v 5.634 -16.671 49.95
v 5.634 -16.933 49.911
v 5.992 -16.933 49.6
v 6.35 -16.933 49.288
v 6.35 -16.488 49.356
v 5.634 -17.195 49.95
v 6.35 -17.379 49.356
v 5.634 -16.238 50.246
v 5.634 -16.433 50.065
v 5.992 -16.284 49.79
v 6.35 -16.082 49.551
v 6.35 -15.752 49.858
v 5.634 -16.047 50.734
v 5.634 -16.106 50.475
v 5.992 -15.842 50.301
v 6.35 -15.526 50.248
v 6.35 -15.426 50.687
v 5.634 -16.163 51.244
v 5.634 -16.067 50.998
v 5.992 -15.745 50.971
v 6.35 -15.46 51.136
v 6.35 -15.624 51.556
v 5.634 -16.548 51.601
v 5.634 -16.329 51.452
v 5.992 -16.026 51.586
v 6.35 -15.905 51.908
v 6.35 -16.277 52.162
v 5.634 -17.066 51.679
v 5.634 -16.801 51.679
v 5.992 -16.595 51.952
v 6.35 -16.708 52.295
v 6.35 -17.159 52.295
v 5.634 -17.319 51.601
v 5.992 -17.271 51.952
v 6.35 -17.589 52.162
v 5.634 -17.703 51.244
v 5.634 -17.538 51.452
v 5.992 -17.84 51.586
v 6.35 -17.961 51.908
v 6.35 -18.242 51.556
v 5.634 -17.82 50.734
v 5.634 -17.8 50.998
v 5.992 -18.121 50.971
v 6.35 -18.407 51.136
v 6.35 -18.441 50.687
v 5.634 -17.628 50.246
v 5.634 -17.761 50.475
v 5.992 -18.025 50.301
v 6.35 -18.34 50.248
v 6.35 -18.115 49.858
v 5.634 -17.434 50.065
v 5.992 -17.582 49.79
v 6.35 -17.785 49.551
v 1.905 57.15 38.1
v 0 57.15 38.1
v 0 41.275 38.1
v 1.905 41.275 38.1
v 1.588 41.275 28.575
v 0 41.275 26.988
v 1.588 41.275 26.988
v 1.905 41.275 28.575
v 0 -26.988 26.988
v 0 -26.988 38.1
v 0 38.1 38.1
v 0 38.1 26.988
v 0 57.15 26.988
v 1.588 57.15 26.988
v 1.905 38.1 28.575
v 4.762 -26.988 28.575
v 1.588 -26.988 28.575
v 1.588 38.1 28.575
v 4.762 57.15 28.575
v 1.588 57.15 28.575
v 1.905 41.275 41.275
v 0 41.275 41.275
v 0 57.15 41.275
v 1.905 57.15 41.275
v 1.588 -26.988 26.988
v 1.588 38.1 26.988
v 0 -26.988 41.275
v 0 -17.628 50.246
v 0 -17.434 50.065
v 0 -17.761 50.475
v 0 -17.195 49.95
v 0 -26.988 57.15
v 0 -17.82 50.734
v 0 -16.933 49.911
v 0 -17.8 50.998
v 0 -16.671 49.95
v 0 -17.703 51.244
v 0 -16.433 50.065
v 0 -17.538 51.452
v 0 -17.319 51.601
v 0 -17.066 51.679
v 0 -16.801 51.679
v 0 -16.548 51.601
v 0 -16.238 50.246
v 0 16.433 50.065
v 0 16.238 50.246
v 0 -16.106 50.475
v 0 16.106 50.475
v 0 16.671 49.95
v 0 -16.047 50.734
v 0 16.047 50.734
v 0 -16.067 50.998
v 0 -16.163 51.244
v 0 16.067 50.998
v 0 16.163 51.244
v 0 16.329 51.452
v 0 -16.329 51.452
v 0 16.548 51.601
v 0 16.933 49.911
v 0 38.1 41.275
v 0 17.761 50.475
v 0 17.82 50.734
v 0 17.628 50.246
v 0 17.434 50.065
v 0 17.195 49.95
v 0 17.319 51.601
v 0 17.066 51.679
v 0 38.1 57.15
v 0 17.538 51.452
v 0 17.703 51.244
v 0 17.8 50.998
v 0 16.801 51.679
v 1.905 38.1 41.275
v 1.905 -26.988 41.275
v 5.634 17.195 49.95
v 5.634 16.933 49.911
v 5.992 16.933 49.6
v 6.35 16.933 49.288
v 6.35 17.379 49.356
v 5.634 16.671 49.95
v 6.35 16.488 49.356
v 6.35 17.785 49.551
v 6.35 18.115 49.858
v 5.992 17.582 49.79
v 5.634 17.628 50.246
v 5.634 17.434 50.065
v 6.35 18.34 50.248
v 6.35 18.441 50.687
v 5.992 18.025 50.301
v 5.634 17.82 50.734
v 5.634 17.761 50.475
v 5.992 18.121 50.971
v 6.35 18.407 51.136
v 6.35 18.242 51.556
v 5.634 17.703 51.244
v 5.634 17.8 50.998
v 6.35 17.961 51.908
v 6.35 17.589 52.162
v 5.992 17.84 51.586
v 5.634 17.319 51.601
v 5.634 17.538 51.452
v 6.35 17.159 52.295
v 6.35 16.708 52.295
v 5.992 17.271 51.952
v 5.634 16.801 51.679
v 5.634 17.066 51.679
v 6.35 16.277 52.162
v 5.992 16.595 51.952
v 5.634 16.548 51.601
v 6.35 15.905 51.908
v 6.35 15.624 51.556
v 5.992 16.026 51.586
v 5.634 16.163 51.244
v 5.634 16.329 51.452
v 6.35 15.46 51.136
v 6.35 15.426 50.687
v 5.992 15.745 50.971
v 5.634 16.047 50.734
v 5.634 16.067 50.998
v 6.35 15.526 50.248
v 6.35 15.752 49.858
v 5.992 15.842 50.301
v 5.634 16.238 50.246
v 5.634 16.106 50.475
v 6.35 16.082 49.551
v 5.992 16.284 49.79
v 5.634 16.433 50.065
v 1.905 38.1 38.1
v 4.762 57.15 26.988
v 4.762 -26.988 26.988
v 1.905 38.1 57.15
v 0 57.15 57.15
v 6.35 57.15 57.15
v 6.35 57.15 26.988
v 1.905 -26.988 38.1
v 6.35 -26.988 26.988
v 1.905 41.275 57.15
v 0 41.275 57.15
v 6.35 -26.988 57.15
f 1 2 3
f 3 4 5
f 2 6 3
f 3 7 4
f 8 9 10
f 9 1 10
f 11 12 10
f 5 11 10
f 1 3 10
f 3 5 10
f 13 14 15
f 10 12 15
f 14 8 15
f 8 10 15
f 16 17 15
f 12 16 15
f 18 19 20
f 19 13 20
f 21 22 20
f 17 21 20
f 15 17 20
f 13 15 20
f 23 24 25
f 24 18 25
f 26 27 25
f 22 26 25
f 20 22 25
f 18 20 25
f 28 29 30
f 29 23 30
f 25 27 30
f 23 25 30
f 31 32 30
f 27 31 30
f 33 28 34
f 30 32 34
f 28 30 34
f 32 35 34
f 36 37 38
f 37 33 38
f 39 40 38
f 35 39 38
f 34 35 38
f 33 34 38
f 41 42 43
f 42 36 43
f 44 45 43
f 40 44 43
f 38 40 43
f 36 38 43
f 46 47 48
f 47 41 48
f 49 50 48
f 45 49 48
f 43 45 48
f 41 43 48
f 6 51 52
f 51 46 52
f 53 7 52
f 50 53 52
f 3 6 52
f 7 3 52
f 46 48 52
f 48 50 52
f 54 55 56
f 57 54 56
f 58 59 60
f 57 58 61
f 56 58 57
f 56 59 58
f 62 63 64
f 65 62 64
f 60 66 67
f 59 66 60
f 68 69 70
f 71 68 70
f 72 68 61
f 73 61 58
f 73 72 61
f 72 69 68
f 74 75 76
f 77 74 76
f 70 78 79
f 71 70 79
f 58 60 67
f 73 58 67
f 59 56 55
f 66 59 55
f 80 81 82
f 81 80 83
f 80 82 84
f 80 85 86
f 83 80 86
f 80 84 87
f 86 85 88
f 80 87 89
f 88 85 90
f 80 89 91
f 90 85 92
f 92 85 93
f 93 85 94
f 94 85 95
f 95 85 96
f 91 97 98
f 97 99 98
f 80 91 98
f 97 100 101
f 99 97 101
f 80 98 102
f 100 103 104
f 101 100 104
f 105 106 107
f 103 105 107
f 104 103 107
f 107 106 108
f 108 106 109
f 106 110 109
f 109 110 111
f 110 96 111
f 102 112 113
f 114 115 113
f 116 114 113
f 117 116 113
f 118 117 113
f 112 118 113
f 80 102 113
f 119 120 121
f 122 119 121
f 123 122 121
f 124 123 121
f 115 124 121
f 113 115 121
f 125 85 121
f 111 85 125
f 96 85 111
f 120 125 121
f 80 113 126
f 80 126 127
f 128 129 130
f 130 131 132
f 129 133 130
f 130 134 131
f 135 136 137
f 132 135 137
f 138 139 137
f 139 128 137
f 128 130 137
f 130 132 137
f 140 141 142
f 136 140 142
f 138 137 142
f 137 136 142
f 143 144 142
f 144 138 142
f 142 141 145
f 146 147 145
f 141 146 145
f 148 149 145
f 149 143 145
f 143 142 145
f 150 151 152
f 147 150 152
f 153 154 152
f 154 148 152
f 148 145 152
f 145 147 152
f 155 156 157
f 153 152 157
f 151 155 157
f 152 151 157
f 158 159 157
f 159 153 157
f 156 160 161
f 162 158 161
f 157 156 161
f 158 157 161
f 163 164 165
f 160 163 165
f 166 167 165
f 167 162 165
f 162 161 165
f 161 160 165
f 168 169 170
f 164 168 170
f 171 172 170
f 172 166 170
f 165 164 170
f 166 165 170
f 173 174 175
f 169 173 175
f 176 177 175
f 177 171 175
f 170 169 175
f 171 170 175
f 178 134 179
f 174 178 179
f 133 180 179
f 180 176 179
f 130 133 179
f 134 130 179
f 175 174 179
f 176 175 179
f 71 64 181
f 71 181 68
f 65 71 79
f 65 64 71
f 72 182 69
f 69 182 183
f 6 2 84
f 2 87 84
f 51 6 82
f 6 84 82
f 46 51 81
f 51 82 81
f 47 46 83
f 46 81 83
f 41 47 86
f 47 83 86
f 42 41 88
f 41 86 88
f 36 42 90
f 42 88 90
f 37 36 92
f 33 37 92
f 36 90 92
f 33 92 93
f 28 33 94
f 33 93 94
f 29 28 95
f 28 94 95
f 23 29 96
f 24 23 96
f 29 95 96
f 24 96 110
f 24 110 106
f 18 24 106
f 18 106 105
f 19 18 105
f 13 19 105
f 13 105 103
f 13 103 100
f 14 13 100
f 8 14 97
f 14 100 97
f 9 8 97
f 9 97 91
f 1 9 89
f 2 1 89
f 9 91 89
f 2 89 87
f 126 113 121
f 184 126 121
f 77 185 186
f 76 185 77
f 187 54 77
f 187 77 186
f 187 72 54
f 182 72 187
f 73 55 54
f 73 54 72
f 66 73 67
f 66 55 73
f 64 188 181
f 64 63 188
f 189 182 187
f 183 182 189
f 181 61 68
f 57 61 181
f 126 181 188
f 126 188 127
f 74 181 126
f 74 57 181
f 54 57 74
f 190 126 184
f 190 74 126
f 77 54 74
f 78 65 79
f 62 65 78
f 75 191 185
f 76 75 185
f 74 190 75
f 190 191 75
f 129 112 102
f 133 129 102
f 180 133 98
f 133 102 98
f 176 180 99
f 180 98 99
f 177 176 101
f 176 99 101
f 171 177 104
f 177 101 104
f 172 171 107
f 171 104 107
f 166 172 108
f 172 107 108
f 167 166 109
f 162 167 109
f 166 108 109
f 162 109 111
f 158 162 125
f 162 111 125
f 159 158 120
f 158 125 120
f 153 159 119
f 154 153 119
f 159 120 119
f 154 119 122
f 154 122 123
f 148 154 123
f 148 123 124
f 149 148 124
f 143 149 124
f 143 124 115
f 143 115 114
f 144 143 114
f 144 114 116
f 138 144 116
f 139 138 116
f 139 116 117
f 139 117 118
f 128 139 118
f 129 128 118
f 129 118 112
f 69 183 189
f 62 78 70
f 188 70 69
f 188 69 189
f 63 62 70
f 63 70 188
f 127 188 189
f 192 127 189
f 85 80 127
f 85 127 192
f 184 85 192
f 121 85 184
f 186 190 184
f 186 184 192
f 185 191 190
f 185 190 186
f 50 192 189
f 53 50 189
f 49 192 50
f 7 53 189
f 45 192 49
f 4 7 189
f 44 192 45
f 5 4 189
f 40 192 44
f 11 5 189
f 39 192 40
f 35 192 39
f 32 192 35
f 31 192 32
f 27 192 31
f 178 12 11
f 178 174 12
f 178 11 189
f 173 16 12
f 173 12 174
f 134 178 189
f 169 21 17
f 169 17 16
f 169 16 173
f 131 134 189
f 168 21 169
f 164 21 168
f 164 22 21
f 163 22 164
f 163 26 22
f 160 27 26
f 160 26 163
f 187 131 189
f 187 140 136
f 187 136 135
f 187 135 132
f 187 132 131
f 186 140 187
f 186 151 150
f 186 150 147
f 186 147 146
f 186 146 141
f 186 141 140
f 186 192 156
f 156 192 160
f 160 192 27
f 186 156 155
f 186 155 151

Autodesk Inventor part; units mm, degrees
ref_plane "YZ Plane" through (0, 0, 0) normal (1, 0, 0) x (0, 1, 0)
ref_plane "XZ Plane" through (0, 0, 0) normal (0, 1, 0) x (-1, 0, 0)
ref_plane "XY Plane" through (0, 0, 0) normal (0, 0, 1) x (1, 0, 0)
sketch "Sketch1" plane through (0, 0, 0) normal (1, 0, 0) x (0, 1, 0)
  line L0 (-57.15, 57.15) -> (57.15, 57.15)
  line L1 (57.15, 57.15) -> (57.15, 0)
  line L2 (57.15, 0) -> (-57.15, 0)
  line L3 (-57.15, 0) -> (-57.15, 57.15)
  line L4 (-57.15, 57.15) -> (57.15, 0) construction
  line L5 (57.15, 57.15) -> (-57.15, 0) construction
  line L6 (-26.9875, 0) -> (26.9875, 0)
  line L7 (26.9875, 0) -> (26.9875, 26.9875)
  line L8 (26.9875, 26.9875) -> (-26.9875, 26.9875)
  line L9 (-26.9875, 26.9875) -> (-26.9875, 0)
  line L10 (-26.9875, 26.9875) -> (-26.9875, 57.15)
  line L11 (26.9875, 26.9875) -> (57.15, 26.9875)
  point P0 (0, 0)
  point P1 (0, 28.575)
  point P2 (0, 0)
  dimension "d5" = 114.3
  dimension "d6" = 57.15
  dimension "d7" = 53.975
  dimension "d8" = 26.9875
extrude "Extrusion1" add sketch "Sketch1" along normal blind 6.35 contours L0 L1 L11 L8 L10
sketch "Sketch2" plane through (0, -26.9875, 26.9875) normal (0, 0, -1) x (-1, 0, 0)
  line L0 (0, 0) -> (0, 84.1375) projected
  line L1 (0, 84.1375) -> (-6.35, 84.1375) projected
  line L2 (-6.35, 0) -> (-6.35, 84.1375) projected
  line L3 (0, 0) -> (-6.35, 0) projected
  line L4 (-3.175, 0) -> (-3.175, 84.1375)
  line L5 (-4.7625, 0) -> (-1.5875, 0)
  line L6 (-1.5875, 0) -> (-1.5875, 84.1375)
  line L7 (-1.5875, 84.1375) -> (-4.7625, 84.1375)
  line L8 (-4.7625, 84.1375) -> (-4.7625, 0)
  line L9 (-4.7625, 0) -> (-1.5875, 84.1375) construction
  line L10 (-1.5875, 0) -> (-4.7625, 84.1375) construction
  point P0 (0, 26.9875)
  point P1 (-3.175, 42.0688)
  dimension "d11" = 3.175
extrude "Extrusion2" cut sketch "Sketch2" against normal blind 1.5875 contours L3 L4 L1 L6 | L3 L8 L1 L4
sketch "Sketch3" plane through (6.35, 0, 0) normal (1, 0, 0) x (0, 0, -1)
  line L0 (-26.9875, -26.9875) -> (-26.9875, 57.15) projected
  line L1 (-26.9875, 57.15) -> (-57.15, 57.15) projected
  line L2 (-57.15, 57.15) -> (-57.15, -26.9875) projected
  line L3 (-57.15, -26.9875) -> (-26.9875, -26.9875) projected
  line L4 (-50.8, -16.9333) -> (-50.8, 16.9333)
  point P0 (0, 0)
  dimension "d16" = 40.2167
  dimension "d31" = 33.8667
  dimension "d32" = 6.35
hole "Hole1" at (6.35, -16.9333, 50.8) at (6.35, 16.9333, 50.8) direction (-1, 0, 0) diameter 1.778 end through all countersink diameter 3.023 countersink angle 82 clearance for "Flat Head Machine Screw (82)" size "#0" standard "Ansi Unified Screw Threads"
sketch "Sketch4" plane through (0, 0, 0) normal (-1, 0, 0) x (0, 0, 1)
  line L0 (-38.1, -38.1) -> (38.1, -38.1)
  line L1 (38.1, -38.1) -> (38.1, 38.1)
  line L2 (38.1, 38.1) -> (-38.1, 38.1)
  line L3 (-38.1, 38.1) -> (-38.1, -38.1)
  line L4 (-38.1, -38.1) -> (38.1, 38.1) construction
  line L5 (38.1, -38.1) -> (-38.1, 38.1) construction
  line L6 (-41.275, 41.275) -> (41.275, 41.275)
  line L7 (41.275, 41.275) -> (41.275, -41.275)
  line L8 (41.275, -41.275) -> (-41.275, -41.275)
  line L9 (-41.275, -41.275) -> (-41.275, 41.275)
  line L10 (-41.275, 41.275) -> (41.275, -41.275) construction
  line L11 (41.275, 41.275) -> (-41.275, -41.275) construction
  line L12 (26.9875, 57.15) -> (57.15, 57.15) projected
  line L13 (38.1, 38.1) -> (41.275, 38.1)
  line L14 (41.275, 38.1) -> (41.275, 57.15)
  line L15 (41.275, 57.15) -> (38.1, 57.15)
  line L16 (38.1, 57.15) -> (38.1, 38.1)
  line L17 (38.1, 38.1) -> (57.15, 38.1)
  line L18 (57.15, 38.1) -> (57.15, 41.275)
  line L19 (57.15, 41.275) -> (38.1, 41.275)
  line L20 (38.1, 41.275) -> (38.1, 38.1)
  line L21 (57.15, 57.15) -> (57.15, -26.9875) projected
  point P0 (0, 0)
  dimension "d24" = 76.2
  dimension "d25" = 76.2
  dimension "d26" = 3.175
  dimension "d27" = 3.175
extrude "Extrusion3" cut sketch "Sketch4" against normal blind 1.905 contours L13 L7 L8 L9 L6 L16 | L16 L6 L7 L13 | L7 L19 L18 L17 | L16 L12 L14 L6
equation "\"d5\" = width + 2 * acrylicThickness"
equation "\"d6\" = acrylicThickness + 0.5 * height"
equation "\"d7\" = sensorHolderSensorWidth"
equation "\"d8\" = 0.5 * sensorHolderSesnorHeight"
equation "\"d9\" = acrylicThickness"
equation "\"d11\" = oRingWidth"
equation "\"d12\" = 0.5 * oRingWidth"
equation "\"d16\" = 0.333333 * width + acrylicThickness"
equation "\"d31\" = 0.333333 * width"
equation "\"d32\" = acrylicThickness"
equation "\"d24\" = 0.25 * sensorHolderFlushORingID"
equation "\"d25\" = 0.25 * sensorHolderFlushORingID"
equation "\"d26\" = oRingWidth"
equation "\"d27\" = oRingWidth"
equation "\"acrylicThickness\" = 6.35"
equation "\"height\" = 101.6"
equation "\"width\" = 101.6"
equation "\"depth\" = 101.6"
equation "\"mirrorAngle\" = 5deg"
equation "\"detectorWidth\" = 52"
equation "\"detectorHeight\" = 52"
equation "\"mirrorThickness\" = 3"
equation "\"fresnelThickness\" = 0.1"
equation "\"focalLength\" = 76.2"
equation "\"ior\" = 1.49"
equation "\"centerThickness\" = 1.524"
equation "\"fresnelAngle\" = 90deg"
equation "\"fresnelEffectiveDiameter\" = 76.2"
equation "\"mirrorSuppourtWidth\" = 38.1"
equation "\"backGrooveBit\" = 4.8006"
equation "\"sensorHolderWidth\" = 88.9"
equation "\"sensorHolderHeight\" = 88.9"
equation "\"sensorHolderSesnorHeight\" = 53.975"
equation "\"sensorHolderSensorWidth\" = 53.975"
equation "\"sensorHolderSensorHeight\" = 53.975"
equation "\"sensorHolderORingGroove\" = 3.175"
equation "\"sensorHolderORing\" = 3.175"
equation "\"sensorHolderFlushORing\" = 3.175"
equation "\"sensorHolderFlushORingID\" = 304.8"
equation "\"frontBackORingID\" = 419.1"
equation "\"oRingWidth\" = 3.175"
equation "\"sensorHolderORingID\" = 203.2"
equation "\"topBottomHorizontalMirrorGroove\" = 12.7"
equation "\"backMirrorGroove\" = 6.35"
equation "\"mirrorGroove\" = 19.05"
equation "\"fresnelChamfer\" = 6.35"
equation "\"mirrorGrooveFillet\" = 6.35"
equation "\"mirrorGrooveDrill\" = 6.35"
equation "\"mirrorGrooveMill\" = 3.175"
equation "\"fresnelMirrorChamfer\" = 6.35"
equation "\"detectorOpeningWidth\" = 76.2"
equation "\"detectorOpeningHeight\" = 76.2"
properties part number "sensorHolder" material "ABS Plastic"
